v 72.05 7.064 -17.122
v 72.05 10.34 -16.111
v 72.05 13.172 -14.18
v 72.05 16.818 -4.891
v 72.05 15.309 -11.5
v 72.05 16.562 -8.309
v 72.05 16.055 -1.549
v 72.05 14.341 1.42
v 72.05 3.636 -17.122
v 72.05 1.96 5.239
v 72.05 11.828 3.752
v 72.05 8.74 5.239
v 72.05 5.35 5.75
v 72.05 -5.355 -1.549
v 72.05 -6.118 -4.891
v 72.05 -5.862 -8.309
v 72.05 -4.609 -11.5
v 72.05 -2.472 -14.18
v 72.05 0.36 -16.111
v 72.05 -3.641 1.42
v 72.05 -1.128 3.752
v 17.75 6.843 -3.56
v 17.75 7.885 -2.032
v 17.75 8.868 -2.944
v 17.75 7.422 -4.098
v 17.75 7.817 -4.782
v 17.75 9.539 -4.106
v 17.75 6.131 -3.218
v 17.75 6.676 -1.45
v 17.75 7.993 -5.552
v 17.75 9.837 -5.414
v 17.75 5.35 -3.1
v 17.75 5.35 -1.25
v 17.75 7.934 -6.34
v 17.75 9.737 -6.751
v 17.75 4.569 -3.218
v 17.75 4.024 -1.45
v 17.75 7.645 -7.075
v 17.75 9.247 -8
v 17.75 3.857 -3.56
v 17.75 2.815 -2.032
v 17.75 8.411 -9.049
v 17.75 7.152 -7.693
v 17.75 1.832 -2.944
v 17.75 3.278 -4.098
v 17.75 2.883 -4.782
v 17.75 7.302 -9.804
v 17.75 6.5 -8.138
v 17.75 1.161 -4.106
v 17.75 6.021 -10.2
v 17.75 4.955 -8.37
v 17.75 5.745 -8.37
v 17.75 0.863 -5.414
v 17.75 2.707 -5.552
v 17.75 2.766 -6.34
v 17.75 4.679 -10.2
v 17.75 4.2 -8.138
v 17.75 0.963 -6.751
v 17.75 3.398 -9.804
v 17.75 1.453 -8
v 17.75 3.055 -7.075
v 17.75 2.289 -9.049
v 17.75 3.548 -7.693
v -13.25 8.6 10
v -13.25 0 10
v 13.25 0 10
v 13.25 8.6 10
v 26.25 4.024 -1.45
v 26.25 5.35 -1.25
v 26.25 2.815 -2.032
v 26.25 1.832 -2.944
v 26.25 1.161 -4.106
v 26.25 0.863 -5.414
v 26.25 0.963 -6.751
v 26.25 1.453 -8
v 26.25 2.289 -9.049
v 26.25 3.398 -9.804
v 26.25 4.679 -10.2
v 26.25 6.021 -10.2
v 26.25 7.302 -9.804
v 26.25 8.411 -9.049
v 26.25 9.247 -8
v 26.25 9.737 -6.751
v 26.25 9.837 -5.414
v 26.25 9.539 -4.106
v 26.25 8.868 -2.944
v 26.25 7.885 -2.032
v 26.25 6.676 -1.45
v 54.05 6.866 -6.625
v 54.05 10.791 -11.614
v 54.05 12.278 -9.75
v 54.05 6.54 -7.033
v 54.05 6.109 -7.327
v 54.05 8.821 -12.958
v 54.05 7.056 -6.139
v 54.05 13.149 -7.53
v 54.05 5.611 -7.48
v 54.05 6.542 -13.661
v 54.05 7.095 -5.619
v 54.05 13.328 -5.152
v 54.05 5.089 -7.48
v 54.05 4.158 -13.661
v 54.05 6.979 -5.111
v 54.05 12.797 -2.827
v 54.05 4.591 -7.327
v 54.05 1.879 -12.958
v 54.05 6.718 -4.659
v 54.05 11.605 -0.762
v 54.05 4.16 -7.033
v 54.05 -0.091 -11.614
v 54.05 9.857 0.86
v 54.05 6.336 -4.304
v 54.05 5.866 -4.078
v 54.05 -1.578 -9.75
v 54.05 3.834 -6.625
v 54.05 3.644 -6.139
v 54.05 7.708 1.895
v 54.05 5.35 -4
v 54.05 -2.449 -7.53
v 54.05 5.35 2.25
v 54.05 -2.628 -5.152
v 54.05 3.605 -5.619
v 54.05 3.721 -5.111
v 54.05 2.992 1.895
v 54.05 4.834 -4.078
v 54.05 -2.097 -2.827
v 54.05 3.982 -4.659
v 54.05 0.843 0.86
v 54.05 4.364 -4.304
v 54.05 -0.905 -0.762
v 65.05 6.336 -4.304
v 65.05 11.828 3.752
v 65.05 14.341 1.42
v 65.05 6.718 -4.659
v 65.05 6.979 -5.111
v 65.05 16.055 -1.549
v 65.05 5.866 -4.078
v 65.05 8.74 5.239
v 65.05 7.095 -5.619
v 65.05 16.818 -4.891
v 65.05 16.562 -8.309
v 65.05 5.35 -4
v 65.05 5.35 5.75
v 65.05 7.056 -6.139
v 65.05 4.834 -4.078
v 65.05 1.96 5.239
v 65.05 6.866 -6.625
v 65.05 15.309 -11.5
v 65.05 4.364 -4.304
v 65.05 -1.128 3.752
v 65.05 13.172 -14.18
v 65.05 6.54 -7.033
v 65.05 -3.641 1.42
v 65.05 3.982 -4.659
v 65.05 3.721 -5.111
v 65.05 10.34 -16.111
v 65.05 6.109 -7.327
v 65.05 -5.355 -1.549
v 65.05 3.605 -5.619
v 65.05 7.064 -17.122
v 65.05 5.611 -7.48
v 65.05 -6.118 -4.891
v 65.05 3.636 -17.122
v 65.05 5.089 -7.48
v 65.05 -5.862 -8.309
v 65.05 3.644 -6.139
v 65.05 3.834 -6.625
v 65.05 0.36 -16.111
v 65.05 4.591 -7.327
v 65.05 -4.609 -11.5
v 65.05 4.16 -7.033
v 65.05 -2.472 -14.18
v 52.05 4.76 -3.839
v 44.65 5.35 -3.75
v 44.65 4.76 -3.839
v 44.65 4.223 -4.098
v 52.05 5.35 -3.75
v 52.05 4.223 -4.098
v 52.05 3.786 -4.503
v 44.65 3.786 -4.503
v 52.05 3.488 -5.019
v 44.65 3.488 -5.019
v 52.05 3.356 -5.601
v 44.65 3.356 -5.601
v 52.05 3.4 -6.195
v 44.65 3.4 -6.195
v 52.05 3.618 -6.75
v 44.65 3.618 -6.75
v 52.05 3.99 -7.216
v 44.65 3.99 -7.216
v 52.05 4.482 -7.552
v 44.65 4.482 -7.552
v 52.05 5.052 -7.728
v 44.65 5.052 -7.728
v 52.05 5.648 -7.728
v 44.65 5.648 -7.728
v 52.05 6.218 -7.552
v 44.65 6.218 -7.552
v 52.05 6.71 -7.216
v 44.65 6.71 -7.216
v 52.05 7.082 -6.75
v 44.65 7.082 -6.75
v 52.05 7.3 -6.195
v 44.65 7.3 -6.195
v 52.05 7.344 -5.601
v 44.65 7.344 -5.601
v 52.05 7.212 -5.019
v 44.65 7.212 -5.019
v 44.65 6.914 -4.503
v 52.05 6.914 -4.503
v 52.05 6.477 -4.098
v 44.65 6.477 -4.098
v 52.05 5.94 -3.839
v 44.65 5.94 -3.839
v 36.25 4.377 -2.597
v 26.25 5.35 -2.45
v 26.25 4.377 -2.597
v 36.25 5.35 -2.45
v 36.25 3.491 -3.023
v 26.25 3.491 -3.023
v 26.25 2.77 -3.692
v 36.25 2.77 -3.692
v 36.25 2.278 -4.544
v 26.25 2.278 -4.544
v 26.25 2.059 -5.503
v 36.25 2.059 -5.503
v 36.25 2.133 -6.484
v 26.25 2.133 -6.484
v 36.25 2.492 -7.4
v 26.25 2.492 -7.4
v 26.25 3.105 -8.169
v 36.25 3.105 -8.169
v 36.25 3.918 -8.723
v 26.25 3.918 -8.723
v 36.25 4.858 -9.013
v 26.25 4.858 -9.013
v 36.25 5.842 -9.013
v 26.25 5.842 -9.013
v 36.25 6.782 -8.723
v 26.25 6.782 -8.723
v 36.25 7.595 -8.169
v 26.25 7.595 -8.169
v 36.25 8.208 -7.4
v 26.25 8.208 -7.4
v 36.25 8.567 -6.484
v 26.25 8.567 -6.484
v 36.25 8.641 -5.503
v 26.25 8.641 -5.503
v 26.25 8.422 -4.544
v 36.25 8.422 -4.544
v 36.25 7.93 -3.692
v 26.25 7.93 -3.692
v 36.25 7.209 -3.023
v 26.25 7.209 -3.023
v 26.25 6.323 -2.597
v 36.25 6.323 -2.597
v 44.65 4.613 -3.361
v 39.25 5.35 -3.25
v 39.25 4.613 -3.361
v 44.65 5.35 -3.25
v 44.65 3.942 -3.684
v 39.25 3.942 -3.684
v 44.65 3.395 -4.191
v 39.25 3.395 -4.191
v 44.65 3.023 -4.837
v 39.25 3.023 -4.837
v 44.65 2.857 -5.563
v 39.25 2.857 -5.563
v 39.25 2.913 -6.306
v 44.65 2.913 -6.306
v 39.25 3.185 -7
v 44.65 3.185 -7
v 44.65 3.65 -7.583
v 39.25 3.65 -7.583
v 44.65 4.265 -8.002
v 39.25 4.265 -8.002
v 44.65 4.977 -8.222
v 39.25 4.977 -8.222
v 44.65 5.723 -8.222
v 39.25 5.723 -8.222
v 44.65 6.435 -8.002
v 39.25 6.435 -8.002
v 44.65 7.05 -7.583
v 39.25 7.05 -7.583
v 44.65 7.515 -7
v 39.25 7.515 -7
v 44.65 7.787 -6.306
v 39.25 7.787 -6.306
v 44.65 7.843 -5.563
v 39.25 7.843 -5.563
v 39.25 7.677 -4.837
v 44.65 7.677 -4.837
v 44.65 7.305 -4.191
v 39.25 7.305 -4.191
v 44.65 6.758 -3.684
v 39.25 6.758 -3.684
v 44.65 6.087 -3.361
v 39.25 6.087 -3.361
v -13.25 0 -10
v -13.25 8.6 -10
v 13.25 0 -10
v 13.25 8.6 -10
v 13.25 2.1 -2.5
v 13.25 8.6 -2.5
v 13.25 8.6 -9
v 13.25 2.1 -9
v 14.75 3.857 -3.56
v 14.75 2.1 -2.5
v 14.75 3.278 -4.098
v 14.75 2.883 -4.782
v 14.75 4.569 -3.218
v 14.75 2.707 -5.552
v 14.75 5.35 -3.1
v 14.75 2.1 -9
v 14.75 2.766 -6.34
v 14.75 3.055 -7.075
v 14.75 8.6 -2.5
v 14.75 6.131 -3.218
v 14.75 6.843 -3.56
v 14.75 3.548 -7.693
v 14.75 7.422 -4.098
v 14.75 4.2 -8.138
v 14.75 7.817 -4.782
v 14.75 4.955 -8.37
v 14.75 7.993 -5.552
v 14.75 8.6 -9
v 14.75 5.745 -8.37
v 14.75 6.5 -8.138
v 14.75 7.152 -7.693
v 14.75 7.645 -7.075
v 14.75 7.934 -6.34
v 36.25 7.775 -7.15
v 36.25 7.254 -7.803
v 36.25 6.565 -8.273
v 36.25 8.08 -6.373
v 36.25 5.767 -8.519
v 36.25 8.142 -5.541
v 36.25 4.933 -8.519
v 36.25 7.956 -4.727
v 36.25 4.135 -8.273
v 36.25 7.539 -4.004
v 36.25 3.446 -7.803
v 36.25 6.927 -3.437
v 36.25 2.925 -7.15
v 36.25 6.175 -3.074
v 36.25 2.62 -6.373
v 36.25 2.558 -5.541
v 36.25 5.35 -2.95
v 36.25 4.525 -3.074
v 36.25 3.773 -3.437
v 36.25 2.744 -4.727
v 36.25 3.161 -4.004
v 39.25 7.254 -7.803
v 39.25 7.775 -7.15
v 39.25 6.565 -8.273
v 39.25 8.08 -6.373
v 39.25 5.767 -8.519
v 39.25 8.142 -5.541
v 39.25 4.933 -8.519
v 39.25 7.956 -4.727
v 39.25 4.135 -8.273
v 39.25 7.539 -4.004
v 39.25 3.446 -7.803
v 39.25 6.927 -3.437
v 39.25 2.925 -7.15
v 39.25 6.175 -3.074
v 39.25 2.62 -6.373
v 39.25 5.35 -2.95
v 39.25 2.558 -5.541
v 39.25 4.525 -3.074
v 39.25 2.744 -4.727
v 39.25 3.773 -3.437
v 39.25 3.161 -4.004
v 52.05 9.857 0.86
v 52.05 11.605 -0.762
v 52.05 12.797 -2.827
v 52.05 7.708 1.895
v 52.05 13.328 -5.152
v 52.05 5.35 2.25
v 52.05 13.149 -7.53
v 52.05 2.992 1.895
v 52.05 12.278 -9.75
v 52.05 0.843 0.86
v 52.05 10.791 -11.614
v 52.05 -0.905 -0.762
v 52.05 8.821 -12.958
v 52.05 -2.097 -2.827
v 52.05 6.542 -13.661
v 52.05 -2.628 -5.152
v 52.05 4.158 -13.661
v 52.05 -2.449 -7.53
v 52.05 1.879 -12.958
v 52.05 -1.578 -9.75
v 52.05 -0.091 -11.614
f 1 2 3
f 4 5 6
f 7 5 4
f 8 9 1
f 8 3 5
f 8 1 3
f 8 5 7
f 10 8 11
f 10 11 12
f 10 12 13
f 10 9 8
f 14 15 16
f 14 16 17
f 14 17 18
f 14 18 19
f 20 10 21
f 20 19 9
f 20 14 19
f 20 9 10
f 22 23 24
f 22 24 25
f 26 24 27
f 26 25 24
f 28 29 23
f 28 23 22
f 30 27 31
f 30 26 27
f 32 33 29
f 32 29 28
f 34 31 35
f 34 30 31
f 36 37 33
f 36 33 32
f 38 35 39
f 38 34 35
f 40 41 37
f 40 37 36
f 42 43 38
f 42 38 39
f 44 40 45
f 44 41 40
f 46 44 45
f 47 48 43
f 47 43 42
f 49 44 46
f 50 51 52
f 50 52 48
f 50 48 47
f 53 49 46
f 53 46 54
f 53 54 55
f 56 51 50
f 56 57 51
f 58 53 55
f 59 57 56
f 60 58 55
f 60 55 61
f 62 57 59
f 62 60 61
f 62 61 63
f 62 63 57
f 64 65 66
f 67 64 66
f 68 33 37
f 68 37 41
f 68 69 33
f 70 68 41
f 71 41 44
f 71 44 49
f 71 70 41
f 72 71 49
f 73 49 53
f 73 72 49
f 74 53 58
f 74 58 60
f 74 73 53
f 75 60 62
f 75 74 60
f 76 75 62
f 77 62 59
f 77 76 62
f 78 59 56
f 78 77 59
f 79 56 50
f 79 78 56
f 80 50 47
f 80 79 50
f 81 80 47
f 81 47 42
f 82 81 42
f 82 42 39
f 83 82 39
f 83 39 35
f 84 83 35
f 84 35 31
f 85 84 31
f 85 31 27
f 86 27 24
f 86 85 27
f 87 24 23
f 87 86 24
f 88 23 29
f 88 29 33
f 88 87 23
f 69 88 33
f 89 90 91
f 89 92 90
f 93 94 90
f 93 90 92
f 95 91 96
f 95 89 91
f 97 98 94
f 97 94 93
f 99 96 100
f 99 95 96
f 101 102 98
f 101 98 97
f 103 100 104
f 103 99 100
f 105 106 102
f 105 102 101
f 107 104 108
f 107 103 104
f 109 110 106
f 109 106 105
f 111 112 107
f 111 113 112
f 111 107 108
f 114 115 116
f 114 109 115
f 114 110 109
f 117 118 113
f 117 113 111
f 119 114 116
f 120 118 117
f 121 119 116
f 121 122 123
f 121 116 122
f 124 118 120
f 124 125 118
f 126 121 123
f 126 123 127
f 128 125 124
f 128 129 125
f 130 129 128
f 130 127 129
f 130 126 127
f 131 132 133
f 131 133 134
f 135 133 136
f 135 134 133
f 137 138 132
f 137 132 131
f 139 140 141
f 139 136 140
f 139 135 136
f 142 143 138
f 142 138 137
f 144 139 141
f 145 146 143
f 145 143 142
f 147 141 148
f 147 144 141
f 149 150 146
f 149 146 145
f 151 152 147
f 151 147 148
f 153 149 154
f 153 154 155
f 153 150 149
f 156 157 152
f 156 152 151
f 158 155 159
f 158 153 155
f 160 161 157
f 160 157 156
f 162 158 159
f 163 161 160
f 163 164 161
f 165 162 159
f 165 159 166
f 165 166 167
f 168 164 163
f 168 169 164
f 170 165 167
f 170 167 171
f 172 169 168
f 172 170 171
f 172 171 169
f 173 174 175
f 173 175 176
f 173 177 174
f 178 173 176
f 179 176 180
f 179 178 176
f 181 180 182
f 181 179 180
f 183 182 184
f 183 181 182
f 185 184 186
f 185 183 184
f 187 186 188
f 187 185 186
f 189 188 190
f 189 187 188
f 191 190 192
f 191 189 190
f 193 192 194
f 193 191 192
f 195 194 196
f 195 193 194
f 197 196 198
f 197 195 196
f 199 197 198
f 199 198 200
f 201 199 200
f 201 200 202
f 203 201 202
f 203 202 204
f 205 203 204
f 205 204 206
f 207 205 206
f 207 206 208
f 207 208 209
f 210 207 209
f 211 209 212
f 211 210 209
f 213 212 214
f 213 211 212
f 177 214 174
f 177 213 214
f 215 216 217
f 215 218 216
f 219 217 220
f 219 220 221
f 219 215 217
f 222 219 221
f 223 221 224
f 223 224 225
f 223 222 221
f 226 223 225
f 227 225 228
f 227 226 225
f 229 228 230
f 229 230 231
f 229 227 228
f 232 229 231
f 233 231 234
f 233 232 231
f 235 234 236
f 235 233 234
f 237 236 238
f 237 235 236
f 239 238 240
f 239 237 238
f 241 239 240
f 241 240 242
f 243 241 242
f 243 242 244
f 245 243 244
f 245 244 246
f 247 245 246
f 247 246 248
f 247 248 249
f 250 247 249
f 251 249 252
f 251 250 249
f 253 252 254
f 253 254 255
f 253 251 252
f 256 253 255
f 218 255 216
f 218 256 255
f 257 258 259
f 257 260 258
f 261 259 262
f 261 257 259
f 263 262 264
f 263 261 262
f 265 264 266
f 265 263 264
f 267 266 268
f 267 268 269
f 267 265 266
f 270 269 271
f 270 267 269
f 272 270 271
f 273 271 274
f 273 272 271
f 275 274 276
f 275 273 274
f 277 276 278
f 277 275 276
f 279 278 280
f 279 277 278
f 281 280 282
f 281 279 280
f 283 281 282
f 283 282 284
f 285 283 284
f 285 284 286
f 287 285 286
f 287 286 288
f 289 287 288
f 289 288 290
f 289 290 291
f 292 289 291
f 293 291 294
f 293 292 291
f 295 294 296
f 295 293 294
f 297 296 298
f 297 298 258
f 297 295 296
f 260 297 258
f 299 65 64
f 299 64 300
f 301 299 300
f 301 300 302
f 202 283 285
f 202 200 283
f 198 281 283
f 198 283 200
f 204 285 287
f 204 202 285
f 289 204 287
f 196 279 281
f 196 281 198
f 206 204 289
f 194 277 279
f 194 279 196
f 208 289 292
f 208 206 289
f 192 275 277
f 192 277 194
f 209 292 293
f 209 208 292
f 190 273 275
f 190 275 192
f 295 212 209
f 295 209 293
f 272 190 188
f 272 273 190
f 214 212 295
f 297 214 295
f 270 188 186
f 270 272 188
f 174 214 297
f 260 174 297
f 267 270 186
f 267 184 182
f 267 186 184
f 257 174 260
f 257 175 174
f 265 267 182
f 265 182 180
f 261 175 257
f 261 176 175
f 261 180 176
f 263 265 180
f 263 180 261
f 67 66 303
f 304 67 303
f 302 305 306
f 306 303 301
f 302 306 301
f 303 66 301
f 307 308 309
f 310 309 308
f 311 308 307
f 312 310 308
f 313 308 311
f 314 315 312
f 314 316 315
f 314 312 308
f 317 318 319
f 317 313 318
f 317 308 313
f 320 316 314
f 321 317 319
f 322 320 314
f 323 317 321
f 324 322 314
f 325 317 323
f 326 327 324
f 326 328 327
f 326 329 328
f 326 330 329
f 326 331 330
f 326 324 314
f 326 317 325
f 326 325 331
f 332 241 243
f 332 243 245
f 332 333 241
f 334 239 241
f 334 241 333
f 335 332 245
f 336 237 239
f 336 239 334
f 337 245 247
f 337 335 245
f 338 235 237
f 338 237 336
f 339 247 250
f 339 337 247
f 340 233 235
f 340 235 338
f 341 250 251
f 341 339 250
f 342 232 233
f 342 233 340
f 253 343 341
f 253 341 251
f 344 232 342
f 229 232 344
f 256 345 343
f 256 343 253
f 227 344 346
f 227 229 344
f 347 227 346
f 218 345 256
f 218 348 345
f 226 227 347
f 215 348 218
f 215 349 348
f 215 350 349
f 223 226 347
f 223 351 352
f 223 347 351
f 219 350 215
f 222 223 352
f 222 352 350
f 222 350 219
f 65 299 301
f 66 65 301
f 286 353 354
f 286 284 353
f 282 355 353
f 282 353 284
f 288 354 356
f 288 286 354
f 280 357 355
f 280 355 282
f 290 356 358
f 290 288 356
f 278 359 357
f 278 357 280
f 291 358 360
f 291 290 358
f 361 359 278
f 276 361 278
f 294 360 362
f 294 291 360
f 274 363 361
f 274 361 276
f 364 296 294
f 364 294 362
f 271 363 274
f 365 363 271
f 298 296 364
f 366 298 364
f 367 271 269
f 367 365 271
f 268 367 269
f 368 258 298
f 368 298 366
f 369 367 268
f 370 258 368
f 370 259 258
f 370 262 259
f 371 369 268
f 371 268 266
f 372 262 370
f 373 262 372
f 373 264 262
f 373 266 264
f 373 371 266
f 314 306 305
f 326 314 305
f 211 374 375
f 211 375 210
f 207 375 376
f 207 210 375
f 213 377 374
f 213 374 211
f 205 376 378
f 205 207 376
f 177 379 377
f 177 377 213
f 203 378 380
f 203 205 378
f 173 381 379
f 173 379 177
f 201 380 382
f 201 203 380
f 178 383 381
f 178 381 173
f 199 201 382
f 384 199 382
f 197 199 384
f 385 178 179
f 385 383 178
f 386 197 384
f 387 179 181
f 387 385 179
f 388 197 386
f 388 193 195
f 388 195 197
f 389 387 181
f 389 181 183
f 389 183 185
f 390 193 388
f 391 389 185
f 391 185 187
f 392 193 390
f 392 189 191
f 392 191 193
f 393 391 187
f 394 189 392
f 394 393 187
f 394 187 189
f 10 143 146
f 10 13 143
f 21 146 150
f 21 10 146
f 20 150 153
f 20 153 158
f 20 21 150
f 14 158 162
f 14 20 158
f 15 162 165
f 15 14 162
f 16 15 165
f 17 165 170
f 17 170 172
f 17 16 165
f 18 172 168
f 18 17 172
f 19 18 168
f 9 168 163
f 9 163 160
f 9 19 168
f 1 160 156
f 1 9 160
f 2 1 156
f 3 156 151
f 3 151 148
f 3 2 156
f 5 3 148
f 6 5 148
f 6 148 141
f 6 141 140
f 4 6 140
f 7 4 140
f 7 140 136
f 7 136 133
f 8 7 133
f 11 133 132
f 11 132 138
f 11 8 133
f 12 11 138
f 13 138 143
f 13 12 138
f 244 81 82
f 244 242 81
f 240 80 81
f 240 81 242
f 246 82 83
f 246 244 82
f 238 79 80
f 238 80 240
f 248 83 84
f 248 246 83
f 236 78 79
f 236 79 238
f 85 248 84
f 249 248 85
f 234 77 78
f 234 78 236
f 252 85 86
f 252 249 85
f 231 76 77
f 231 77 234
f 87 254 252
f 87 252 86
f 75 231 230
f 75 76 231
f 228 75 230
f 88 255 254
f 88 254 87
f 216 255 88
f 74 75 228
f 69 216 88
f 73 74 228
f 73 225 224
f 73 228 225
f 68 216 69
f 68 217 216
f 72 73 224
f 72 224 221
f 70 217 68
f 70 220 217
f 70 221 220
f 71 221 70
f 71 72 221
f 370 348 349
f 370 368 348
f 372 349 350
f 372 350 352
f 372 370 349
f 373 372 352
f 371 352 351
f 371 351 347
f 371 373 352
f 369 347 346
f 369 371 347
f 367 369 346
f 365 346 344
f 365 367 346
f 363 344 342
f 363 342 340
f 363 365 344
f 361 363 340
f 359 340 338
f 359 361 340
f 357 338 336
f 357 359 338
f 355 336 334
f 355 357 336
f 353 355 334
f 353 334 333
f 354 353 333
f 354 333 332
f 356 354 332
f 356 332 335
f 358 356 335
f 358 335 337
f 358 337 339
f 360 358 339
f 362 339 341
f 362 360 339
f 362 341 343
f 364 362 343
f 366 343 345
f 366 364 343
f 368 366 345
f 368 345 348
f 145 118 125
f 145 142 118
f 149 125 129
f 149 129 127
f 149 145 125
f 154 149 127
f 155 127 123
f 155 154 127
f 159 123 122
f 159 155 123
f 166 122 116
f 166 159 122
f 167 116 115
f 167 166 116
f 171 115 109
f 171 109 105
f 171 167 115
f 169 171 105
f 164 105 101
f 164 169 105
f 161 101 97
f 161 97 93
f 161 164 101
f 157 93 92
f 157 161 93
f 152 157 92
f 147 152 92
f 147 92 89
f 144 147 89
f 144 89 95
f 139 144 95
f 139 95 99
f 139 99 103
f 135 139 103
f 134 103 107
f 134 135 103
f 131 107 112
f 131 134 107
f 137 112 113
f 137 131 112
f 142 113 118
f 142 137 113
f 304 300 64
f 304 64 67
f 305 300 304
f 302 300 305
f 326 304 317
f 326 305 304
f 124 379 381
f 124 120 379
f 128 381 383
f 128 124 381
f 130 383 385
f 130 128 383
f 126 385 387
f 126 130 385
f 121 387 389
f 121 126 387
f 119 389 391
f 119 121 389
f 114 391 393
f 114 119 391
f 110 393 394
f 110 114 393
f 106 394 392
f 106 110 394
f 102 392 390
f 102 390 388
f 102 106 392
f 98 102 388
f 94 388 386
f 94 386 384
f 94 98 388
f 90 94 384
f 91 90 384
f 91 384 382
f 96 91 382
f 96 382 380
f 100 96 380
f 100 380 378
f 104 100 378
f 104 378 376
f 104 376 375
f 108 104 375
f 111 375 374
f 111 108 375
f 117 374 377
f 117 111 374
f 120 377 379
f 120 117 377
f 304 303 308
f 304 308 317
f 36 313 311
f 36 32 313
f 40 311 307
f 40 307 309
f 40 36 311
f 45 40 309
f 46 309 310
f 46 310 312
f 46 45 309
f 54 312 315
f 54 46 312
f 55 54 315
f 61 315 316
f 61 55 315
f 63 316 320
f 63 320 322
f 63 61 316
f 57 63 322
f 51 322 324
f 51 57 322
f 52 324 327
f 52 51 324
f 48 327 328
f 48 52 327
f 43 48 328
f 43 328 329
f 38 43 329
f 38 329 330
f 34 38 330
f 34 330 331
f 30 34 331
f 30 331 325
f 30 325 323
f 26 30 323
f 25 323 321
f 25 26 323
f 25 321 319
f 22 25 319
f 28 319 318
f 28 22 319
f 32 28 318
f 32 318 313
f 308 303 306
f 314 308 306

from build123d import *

# Parameters (mm, degrees)
SKETCH1_W           = 26.5
SKETCH1_H           = 20
BOSS_EXTRUDE1_DEPTH = 8.6
SKETCH2_W           = 6.5
SKETCH2_H           = 6.5
BOSS_EXTRUDE2_DEPTH = 1.5


with BuildPart() as part:
    # Sketch1 → Boss-Extrude1 (new body)
    with BuildSketch(Plane(origin=(0, 0, 0), x_dir=(1, 0, 0), z_dir=(0, 1, 0))):
        Rectangle(SKETCH1_W, SKETCH1_H)
    extrude(amount=BOSS_EXTRUDE1_DEPTH)

    # Sketch2 → Boss-Extrude2 (add)
    with BuildSketch(Plane(origin=(13.25, 0, 0), x_dir=(0, 0, -1), z_dir=(1, 0, 0))):
        with Locations((5.75, 5.35)):
            Rectangle(SKETCH2_W, SKETCH2_H)
    extrude(amount=BOSS_EXTRUDE2_DEPTH)

    # Sketch6 → Revolve1 (revolve)
    with BuildSketch(Plane.XY.offset(-5.75), mode=Mode.PRIVATE) as revolve1_sk:
        Polygon((14.75, 5.35), (14.75, 2.7), (17.75, 2.7), (17.75, 0.85), (26.25, 0.85), (26.25, 2.05), (36.25, 2.05), (36.25, 2.55), (39.25, 2.55), (39.25, 2.85), (44.65, 2.85), (44.65, 3.35), (52.05, 3.35), (52.05, -2.65), (54.05, -2.65), (54.05, 3.6), (65.05, 3.6), (65.05, -6.15), (72.05, -6.15), (72.05, 5.35), align=None)
    revolve(revolve1_sk.sketch.rotate(Axis((14.75, 5.35, -5.75), (1, 0, 0)), 270), axis=Axis((14.75, 5.35, -5.75), (1, 0, 0)))


solid = part.part
